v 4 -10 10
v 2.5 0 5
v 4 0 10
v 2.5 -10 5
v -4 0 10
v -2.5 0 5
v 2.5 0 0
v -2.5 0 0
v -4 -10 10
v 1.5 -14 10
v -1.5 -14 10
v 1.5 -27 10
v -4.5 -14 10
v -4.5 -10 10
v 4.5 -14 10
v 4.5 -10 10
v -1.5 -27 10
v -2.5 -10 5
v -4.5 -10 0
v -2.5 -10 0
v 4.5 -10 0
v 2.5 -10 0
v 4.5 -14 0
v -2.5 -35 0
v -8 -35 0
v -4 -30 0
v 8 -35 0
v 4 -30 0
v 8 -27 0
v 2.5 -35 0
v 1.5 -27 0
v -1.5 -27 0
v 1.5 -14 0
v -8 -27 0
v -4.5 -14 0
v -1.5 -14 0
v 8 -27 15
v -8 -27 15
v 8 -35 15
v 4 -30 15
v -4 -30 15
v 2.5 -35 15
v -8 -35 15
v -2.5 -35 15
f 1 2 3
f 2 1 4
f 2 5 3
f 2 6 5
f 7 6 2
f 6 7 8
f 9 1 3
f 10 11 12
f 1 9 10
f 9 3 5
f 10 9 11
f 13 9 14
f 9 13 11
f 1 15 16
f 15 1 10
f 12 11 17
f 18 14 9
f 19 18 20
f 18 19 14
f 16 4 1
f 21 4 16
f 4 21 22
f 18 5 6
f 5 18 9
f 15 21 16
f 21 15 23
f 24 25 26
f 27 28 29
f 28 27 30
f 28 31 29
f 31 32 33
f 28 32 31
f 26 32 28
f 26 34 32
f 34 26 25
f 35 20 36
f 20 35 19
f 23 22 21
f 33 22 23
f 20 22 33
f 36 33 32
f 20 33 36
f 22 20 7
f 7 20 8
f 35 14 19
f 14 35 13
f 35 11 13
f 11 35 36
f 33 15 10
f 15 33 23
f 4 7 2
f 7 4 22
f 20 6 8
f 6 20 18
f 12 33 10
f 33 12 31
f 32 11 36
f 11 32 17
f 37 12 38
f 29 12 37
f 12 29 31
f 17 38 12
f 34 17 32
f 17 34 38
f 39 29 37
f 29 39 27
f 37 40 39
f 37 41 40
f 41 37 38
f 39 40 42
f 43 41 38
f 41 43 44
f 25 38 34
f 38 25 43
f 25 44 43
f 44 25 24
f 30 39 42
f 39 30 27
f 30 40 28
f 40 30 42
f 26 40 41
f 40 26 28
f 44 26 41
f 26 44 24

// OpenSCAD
// file: ../../include.scad
//////////////////      END SECTION       //////////////////

	module added_pins(){
		difference(){
			union(){
				translate([30/(15/4),obj_leg*leg_length,30/(15/4)]) pin();
				translate([30/(15/4)+14.5,obj_leg*leg_length,30/(15/4)+14]) pin();
			}
			union(){
							translate([30/(15/4)+13.5,obj_leg*leg_length-20,30/(15/4)+5])cube(size=[2,40,15]);
							translate([30/(15/4)+7.5,obj_leg*leg_length-20,30/(15/4)+15])rotate([0,90,0]) cube(size=[2,40,15]);	

							translate([30/(15/4)-1,obj_leg*leg_length-20,30/(15/4)-8])cube(size=[2,40,15]);
							translate([30/(15/4)-10,obj_leg*leg_length-20,30/(15/4)+1])rotate([0,90,0]) cube(size=[2,40,15]);
			}
		}
	}
	module taken_pins() {
		translate([30/(15/4)+14,obj_leg*leg_length-10,30/(15/4)]) mirror_pin();
		translate([30/(15/4),obj_leg*leg_length-10,30/(15/4)+15]) mirror_pin();
	}


//////////////////      OTHER STUFF       //////////////////

	module holes() {
		rotate([0,0,90]) for(y=[0:other_holes])
		translate([obj_leg+y*15,-15.5,7.5]) union() {
			translate([7.5,0,15]) hole_up();
			hole_down();
		}
	}
	module extend_holes() {
	module top(){
		rotate([0,0,90]) for(y=[0:other_holes+1])
		translate([(30/4)+y*15,-15.5,7.5]) union() {
			translate([7.5,0,15]) hole_up();
		}
	}
	module bottom(){
		rotate([0,0,90]) for(y=[0:other_holes+2])
		translate([(30/4)+y*15,-15.5,7.5]) union() {
			hole_down();
		
}
	}
	union(){
		top();
		bottom();
	}
	}

	module hole() {
		union() {
			rotate([90, 90, 0]) cylinder(h=40, d=hole_pin_diameter, center=true);
			translate([0,7.5,0]) sphere(d=hole_ball_size);
			translate([0,-6,0]) sphere(d=hole_ball_size);
		}
	}
	module hole_up() {
		union() {
			rotate([90, 90, 0]) cylinder(h=40, d=hole_pin_diameter, center=true);
			translate([0,7.5,10]) cylinder(h=hole_pin_height, d=hole_pin_diameter, center=true);
			translate([0,-6,10]) cylinder(h=hole_pin_height, d=hole_pin_diameter, center=true);
			translate([0,7.5,0]) sphere(d=hole_ball_size);
			translate([0,-6,0]) sphere(d=hole_ball_size);
		}
	}
	module hole_down() {
		union() {
			rotate([90, 90, 0]) cylinder(h=40, d=hole_pin_diameter, center=true);
			translate([0,7.5,-10]) cylinder(h=hole_pin_height, d=hole_pin_diameter, center=true);
			translate([0,-6,-10]) cylinder(h=hole_pin_height, d=hole_pin_diameter, center=true);
			translate([0,7.5,0]) sphere(d=hole_ball_size);
			translate([0,-6,0]) sphere(d=hole_ball_size);
		}
	}
	module pin() {
		union() {
			rotate([90, 90, 0]) cylinder(h=pin_height, d=pin_diameter, center=true);
			translate([0,7.5,0]) sphere(d=ball_size);
		}
	}

	module mirror_pin() {
		rotate([90, 90, 0]) cylinder(h=hole_pin_height+small_number, d=hole_pin_diameter, center=true);
		translate([0,-(pin_height-(ball_size/2)),0]) sphere(d=ball_size);
	}


//////////////////      SOME RACK AND Z THINGS       //////////////////

module z_holes() {
    rotate([0,-90,0]) for(z=[0:z_hole_number])
    translate([22.5+z*15,16,-12])
        hole();
}

module pin_cuts() {
	union(){
		cube(size=[2,10,40], center=true);
		rotate([0,0,90]) cube(size=[2,10,40], center=true);
	}
}
module pin_uncut() {
	union(){
		rotate([0, 0, 90]) cylinder(h=hole_pin_height, d=hole_pin_diameter, center=true);
		translate([0,0,10]) sphere(d=ball_hole);
	}
}


module pin_out() {
	union(){
		rotate([0, 0, 90]) cylinder(h=pin_height, d=pin_diameter, center=true);
		translate([0,0,10]) sphere(d= ball_size);
	}
}


module pins_z(){
	difference() {
		pin_out();
		pin_cuts();
	}
}
//////////////////      RACK AND SLIDE     ///////////////////

module straight_pins() {
	for(z=[0:((((obj_leg*leg_length)*2)-(obj_leg*2))/3)/14.5]) rotate([-90,0,0]) translate([z*15,30/(15/4),14]) pins_z();
	for(z=[0:((((obj_leg*leg_length)*2)-(obj_leg*2))/3)/14.5]) rotate([-90,0,0]) translate([z*15,30/(15/4)-14,14]) pins_z();
}
module stagger_pins() {
	for(z=[0:((((obj_leg*leg_length)*2)-(obj_leg*2))/3)/14.5]) rotate([-90,0,0]) translate([z*15,30/(15/4),14]) pins_z();
	for(z=[0:((((obj_leg*leg_length)*2)-(obj_leg*2))/3)/14.5]) rotate([-90,0,0]) translate([z*15+7,30/(15/4)-14,14]) pins_z();
}


//////////////////      DOVE TAIL       //////////////////

module male_dovetail(height) {
	dovetail_3d(max_width,min_width,depth,height);
}

module dovetail_3d(max_width=11, min_width=5, depth=5, height=30) {
	linear_extrude(height=height, convexity=2)
		dovetail_2d(max_width,min_width,depth);
}

module dovetail_2d(max_width=11, min_width=5, depth=5) {
	angle=atan((max_width/2-min_width/2)/depth);
	echo("angle: ", angle);
	polygon(paths=[[0,1,2,3,0]], points=[[-min_width/2,0], [-max_width/2,depth], [max_width/2, depth], [min_width/2,0]]);
}

//bow tie
	module tie_end(height){
				rotate([0,0,0]) translate([0,-0.01,((obj_leg/2)/2)]) male_dovetail(height);
				rotate([0,90,0]) translate([0,-0.01,((obj_leg/2)/2)]) male_dovetail(height);
				rotate([0,180,0]) translate([0,-0.01,((obj_leg/2)/2)]) male_dovetail(height);
				rotate([0,-90,0]) translate([0,-0.01,((obj_leg/2)/2)]) male_dovetail(height);
	}

module bow_support(){
	difference(){
		intersection(){
			translate([-15,0,-15]) cube([30,9,30]);
			scale([1.05,1.05,1.05]) rotate([0,45,0]) tie_end();
		}
		cube([29.2,29.2,29.2], center=true);
	}
}

	module wrap(units){
	for (y = [-1:units-2]) // two iterations, z = -1, z = 1
	{
			translate([15, (y*30)+15, 15]){
			for (r = [0:4]) // two iterations, z = -1, z = 1
			{
				rotate([0,r*90,0]) translate([0,15,15]) rotate([-90,0,0])male_dovetail(height=30);
			}
		}
	}
	}
// file: ../../globals.scad
/*
Most things in this file is represented as one millimeter, so keep that in mind while changing things.
Some of the setting are not mm but at variables that you can set, such as 2*x=2x and you are setting what x is.
I will try to specify when things are variables and not exact measurements.
*/

//Virindi settings
dovetail_male_width_scale = 0.98;
dovetail_male_height_scale = 0.91;

obj_leg = 30;
leg_length = 5.5;
small_number = 0.001;
metal_core_rode_global = 5;


///////////////// number of holes /////////////////////
z_hole_number = 8;
other_holes = 8;

///////////////// Pins /////////////////////

//pins that poke out
ball_size = 10;
pin_height = 20;
pin_diameter = 6;


//holes
hole_ball_size = ball_size;
hole_pin_height = pin_height;
hole_pin_diameter = pin_diameter;

///////////////// Z THINGS /////////////////////

berring_slot_width = 7.5;
berring_slot_depth = 6.5;
metal_core_rode = 5;

///////////////// X THINGS /////////////////////

//male dove tails
max_width=8;
min_width=5;
depth=5;
height=obj_leg/2;

//female dove tails, this is found on the y mounts
girl_max_width=11;
girl_min_width=5;
girl_depth=5;
girl_height=obj_leg;


///////////////// Y THINGS /////////////////////
/*
The Y is so normal that all of those global variables at the top should change all of the setting in it, this section is set her incase there are variables set in the future development of this project.
*/
// main file
include <../../globals.scad>;
include <../../include.scad>;

height = 27;

difference() {
    union() {
        translate([0,0,5]) rotate([90,0,0]) male_dovetail(height=10);
        translate([-4.5, -14, 0]) cube([9,4,10]);
        translate([-2.5, -12, 0]) cube([5,12,5]);
        translate([-1.5, -height, 0]) cube([3,height,10]);
        translate([-8, -height-8, 0]) cube([16,8,15]);
    }
    translate([0, -height-8, 0]) male_dovetail(height=15);
}
